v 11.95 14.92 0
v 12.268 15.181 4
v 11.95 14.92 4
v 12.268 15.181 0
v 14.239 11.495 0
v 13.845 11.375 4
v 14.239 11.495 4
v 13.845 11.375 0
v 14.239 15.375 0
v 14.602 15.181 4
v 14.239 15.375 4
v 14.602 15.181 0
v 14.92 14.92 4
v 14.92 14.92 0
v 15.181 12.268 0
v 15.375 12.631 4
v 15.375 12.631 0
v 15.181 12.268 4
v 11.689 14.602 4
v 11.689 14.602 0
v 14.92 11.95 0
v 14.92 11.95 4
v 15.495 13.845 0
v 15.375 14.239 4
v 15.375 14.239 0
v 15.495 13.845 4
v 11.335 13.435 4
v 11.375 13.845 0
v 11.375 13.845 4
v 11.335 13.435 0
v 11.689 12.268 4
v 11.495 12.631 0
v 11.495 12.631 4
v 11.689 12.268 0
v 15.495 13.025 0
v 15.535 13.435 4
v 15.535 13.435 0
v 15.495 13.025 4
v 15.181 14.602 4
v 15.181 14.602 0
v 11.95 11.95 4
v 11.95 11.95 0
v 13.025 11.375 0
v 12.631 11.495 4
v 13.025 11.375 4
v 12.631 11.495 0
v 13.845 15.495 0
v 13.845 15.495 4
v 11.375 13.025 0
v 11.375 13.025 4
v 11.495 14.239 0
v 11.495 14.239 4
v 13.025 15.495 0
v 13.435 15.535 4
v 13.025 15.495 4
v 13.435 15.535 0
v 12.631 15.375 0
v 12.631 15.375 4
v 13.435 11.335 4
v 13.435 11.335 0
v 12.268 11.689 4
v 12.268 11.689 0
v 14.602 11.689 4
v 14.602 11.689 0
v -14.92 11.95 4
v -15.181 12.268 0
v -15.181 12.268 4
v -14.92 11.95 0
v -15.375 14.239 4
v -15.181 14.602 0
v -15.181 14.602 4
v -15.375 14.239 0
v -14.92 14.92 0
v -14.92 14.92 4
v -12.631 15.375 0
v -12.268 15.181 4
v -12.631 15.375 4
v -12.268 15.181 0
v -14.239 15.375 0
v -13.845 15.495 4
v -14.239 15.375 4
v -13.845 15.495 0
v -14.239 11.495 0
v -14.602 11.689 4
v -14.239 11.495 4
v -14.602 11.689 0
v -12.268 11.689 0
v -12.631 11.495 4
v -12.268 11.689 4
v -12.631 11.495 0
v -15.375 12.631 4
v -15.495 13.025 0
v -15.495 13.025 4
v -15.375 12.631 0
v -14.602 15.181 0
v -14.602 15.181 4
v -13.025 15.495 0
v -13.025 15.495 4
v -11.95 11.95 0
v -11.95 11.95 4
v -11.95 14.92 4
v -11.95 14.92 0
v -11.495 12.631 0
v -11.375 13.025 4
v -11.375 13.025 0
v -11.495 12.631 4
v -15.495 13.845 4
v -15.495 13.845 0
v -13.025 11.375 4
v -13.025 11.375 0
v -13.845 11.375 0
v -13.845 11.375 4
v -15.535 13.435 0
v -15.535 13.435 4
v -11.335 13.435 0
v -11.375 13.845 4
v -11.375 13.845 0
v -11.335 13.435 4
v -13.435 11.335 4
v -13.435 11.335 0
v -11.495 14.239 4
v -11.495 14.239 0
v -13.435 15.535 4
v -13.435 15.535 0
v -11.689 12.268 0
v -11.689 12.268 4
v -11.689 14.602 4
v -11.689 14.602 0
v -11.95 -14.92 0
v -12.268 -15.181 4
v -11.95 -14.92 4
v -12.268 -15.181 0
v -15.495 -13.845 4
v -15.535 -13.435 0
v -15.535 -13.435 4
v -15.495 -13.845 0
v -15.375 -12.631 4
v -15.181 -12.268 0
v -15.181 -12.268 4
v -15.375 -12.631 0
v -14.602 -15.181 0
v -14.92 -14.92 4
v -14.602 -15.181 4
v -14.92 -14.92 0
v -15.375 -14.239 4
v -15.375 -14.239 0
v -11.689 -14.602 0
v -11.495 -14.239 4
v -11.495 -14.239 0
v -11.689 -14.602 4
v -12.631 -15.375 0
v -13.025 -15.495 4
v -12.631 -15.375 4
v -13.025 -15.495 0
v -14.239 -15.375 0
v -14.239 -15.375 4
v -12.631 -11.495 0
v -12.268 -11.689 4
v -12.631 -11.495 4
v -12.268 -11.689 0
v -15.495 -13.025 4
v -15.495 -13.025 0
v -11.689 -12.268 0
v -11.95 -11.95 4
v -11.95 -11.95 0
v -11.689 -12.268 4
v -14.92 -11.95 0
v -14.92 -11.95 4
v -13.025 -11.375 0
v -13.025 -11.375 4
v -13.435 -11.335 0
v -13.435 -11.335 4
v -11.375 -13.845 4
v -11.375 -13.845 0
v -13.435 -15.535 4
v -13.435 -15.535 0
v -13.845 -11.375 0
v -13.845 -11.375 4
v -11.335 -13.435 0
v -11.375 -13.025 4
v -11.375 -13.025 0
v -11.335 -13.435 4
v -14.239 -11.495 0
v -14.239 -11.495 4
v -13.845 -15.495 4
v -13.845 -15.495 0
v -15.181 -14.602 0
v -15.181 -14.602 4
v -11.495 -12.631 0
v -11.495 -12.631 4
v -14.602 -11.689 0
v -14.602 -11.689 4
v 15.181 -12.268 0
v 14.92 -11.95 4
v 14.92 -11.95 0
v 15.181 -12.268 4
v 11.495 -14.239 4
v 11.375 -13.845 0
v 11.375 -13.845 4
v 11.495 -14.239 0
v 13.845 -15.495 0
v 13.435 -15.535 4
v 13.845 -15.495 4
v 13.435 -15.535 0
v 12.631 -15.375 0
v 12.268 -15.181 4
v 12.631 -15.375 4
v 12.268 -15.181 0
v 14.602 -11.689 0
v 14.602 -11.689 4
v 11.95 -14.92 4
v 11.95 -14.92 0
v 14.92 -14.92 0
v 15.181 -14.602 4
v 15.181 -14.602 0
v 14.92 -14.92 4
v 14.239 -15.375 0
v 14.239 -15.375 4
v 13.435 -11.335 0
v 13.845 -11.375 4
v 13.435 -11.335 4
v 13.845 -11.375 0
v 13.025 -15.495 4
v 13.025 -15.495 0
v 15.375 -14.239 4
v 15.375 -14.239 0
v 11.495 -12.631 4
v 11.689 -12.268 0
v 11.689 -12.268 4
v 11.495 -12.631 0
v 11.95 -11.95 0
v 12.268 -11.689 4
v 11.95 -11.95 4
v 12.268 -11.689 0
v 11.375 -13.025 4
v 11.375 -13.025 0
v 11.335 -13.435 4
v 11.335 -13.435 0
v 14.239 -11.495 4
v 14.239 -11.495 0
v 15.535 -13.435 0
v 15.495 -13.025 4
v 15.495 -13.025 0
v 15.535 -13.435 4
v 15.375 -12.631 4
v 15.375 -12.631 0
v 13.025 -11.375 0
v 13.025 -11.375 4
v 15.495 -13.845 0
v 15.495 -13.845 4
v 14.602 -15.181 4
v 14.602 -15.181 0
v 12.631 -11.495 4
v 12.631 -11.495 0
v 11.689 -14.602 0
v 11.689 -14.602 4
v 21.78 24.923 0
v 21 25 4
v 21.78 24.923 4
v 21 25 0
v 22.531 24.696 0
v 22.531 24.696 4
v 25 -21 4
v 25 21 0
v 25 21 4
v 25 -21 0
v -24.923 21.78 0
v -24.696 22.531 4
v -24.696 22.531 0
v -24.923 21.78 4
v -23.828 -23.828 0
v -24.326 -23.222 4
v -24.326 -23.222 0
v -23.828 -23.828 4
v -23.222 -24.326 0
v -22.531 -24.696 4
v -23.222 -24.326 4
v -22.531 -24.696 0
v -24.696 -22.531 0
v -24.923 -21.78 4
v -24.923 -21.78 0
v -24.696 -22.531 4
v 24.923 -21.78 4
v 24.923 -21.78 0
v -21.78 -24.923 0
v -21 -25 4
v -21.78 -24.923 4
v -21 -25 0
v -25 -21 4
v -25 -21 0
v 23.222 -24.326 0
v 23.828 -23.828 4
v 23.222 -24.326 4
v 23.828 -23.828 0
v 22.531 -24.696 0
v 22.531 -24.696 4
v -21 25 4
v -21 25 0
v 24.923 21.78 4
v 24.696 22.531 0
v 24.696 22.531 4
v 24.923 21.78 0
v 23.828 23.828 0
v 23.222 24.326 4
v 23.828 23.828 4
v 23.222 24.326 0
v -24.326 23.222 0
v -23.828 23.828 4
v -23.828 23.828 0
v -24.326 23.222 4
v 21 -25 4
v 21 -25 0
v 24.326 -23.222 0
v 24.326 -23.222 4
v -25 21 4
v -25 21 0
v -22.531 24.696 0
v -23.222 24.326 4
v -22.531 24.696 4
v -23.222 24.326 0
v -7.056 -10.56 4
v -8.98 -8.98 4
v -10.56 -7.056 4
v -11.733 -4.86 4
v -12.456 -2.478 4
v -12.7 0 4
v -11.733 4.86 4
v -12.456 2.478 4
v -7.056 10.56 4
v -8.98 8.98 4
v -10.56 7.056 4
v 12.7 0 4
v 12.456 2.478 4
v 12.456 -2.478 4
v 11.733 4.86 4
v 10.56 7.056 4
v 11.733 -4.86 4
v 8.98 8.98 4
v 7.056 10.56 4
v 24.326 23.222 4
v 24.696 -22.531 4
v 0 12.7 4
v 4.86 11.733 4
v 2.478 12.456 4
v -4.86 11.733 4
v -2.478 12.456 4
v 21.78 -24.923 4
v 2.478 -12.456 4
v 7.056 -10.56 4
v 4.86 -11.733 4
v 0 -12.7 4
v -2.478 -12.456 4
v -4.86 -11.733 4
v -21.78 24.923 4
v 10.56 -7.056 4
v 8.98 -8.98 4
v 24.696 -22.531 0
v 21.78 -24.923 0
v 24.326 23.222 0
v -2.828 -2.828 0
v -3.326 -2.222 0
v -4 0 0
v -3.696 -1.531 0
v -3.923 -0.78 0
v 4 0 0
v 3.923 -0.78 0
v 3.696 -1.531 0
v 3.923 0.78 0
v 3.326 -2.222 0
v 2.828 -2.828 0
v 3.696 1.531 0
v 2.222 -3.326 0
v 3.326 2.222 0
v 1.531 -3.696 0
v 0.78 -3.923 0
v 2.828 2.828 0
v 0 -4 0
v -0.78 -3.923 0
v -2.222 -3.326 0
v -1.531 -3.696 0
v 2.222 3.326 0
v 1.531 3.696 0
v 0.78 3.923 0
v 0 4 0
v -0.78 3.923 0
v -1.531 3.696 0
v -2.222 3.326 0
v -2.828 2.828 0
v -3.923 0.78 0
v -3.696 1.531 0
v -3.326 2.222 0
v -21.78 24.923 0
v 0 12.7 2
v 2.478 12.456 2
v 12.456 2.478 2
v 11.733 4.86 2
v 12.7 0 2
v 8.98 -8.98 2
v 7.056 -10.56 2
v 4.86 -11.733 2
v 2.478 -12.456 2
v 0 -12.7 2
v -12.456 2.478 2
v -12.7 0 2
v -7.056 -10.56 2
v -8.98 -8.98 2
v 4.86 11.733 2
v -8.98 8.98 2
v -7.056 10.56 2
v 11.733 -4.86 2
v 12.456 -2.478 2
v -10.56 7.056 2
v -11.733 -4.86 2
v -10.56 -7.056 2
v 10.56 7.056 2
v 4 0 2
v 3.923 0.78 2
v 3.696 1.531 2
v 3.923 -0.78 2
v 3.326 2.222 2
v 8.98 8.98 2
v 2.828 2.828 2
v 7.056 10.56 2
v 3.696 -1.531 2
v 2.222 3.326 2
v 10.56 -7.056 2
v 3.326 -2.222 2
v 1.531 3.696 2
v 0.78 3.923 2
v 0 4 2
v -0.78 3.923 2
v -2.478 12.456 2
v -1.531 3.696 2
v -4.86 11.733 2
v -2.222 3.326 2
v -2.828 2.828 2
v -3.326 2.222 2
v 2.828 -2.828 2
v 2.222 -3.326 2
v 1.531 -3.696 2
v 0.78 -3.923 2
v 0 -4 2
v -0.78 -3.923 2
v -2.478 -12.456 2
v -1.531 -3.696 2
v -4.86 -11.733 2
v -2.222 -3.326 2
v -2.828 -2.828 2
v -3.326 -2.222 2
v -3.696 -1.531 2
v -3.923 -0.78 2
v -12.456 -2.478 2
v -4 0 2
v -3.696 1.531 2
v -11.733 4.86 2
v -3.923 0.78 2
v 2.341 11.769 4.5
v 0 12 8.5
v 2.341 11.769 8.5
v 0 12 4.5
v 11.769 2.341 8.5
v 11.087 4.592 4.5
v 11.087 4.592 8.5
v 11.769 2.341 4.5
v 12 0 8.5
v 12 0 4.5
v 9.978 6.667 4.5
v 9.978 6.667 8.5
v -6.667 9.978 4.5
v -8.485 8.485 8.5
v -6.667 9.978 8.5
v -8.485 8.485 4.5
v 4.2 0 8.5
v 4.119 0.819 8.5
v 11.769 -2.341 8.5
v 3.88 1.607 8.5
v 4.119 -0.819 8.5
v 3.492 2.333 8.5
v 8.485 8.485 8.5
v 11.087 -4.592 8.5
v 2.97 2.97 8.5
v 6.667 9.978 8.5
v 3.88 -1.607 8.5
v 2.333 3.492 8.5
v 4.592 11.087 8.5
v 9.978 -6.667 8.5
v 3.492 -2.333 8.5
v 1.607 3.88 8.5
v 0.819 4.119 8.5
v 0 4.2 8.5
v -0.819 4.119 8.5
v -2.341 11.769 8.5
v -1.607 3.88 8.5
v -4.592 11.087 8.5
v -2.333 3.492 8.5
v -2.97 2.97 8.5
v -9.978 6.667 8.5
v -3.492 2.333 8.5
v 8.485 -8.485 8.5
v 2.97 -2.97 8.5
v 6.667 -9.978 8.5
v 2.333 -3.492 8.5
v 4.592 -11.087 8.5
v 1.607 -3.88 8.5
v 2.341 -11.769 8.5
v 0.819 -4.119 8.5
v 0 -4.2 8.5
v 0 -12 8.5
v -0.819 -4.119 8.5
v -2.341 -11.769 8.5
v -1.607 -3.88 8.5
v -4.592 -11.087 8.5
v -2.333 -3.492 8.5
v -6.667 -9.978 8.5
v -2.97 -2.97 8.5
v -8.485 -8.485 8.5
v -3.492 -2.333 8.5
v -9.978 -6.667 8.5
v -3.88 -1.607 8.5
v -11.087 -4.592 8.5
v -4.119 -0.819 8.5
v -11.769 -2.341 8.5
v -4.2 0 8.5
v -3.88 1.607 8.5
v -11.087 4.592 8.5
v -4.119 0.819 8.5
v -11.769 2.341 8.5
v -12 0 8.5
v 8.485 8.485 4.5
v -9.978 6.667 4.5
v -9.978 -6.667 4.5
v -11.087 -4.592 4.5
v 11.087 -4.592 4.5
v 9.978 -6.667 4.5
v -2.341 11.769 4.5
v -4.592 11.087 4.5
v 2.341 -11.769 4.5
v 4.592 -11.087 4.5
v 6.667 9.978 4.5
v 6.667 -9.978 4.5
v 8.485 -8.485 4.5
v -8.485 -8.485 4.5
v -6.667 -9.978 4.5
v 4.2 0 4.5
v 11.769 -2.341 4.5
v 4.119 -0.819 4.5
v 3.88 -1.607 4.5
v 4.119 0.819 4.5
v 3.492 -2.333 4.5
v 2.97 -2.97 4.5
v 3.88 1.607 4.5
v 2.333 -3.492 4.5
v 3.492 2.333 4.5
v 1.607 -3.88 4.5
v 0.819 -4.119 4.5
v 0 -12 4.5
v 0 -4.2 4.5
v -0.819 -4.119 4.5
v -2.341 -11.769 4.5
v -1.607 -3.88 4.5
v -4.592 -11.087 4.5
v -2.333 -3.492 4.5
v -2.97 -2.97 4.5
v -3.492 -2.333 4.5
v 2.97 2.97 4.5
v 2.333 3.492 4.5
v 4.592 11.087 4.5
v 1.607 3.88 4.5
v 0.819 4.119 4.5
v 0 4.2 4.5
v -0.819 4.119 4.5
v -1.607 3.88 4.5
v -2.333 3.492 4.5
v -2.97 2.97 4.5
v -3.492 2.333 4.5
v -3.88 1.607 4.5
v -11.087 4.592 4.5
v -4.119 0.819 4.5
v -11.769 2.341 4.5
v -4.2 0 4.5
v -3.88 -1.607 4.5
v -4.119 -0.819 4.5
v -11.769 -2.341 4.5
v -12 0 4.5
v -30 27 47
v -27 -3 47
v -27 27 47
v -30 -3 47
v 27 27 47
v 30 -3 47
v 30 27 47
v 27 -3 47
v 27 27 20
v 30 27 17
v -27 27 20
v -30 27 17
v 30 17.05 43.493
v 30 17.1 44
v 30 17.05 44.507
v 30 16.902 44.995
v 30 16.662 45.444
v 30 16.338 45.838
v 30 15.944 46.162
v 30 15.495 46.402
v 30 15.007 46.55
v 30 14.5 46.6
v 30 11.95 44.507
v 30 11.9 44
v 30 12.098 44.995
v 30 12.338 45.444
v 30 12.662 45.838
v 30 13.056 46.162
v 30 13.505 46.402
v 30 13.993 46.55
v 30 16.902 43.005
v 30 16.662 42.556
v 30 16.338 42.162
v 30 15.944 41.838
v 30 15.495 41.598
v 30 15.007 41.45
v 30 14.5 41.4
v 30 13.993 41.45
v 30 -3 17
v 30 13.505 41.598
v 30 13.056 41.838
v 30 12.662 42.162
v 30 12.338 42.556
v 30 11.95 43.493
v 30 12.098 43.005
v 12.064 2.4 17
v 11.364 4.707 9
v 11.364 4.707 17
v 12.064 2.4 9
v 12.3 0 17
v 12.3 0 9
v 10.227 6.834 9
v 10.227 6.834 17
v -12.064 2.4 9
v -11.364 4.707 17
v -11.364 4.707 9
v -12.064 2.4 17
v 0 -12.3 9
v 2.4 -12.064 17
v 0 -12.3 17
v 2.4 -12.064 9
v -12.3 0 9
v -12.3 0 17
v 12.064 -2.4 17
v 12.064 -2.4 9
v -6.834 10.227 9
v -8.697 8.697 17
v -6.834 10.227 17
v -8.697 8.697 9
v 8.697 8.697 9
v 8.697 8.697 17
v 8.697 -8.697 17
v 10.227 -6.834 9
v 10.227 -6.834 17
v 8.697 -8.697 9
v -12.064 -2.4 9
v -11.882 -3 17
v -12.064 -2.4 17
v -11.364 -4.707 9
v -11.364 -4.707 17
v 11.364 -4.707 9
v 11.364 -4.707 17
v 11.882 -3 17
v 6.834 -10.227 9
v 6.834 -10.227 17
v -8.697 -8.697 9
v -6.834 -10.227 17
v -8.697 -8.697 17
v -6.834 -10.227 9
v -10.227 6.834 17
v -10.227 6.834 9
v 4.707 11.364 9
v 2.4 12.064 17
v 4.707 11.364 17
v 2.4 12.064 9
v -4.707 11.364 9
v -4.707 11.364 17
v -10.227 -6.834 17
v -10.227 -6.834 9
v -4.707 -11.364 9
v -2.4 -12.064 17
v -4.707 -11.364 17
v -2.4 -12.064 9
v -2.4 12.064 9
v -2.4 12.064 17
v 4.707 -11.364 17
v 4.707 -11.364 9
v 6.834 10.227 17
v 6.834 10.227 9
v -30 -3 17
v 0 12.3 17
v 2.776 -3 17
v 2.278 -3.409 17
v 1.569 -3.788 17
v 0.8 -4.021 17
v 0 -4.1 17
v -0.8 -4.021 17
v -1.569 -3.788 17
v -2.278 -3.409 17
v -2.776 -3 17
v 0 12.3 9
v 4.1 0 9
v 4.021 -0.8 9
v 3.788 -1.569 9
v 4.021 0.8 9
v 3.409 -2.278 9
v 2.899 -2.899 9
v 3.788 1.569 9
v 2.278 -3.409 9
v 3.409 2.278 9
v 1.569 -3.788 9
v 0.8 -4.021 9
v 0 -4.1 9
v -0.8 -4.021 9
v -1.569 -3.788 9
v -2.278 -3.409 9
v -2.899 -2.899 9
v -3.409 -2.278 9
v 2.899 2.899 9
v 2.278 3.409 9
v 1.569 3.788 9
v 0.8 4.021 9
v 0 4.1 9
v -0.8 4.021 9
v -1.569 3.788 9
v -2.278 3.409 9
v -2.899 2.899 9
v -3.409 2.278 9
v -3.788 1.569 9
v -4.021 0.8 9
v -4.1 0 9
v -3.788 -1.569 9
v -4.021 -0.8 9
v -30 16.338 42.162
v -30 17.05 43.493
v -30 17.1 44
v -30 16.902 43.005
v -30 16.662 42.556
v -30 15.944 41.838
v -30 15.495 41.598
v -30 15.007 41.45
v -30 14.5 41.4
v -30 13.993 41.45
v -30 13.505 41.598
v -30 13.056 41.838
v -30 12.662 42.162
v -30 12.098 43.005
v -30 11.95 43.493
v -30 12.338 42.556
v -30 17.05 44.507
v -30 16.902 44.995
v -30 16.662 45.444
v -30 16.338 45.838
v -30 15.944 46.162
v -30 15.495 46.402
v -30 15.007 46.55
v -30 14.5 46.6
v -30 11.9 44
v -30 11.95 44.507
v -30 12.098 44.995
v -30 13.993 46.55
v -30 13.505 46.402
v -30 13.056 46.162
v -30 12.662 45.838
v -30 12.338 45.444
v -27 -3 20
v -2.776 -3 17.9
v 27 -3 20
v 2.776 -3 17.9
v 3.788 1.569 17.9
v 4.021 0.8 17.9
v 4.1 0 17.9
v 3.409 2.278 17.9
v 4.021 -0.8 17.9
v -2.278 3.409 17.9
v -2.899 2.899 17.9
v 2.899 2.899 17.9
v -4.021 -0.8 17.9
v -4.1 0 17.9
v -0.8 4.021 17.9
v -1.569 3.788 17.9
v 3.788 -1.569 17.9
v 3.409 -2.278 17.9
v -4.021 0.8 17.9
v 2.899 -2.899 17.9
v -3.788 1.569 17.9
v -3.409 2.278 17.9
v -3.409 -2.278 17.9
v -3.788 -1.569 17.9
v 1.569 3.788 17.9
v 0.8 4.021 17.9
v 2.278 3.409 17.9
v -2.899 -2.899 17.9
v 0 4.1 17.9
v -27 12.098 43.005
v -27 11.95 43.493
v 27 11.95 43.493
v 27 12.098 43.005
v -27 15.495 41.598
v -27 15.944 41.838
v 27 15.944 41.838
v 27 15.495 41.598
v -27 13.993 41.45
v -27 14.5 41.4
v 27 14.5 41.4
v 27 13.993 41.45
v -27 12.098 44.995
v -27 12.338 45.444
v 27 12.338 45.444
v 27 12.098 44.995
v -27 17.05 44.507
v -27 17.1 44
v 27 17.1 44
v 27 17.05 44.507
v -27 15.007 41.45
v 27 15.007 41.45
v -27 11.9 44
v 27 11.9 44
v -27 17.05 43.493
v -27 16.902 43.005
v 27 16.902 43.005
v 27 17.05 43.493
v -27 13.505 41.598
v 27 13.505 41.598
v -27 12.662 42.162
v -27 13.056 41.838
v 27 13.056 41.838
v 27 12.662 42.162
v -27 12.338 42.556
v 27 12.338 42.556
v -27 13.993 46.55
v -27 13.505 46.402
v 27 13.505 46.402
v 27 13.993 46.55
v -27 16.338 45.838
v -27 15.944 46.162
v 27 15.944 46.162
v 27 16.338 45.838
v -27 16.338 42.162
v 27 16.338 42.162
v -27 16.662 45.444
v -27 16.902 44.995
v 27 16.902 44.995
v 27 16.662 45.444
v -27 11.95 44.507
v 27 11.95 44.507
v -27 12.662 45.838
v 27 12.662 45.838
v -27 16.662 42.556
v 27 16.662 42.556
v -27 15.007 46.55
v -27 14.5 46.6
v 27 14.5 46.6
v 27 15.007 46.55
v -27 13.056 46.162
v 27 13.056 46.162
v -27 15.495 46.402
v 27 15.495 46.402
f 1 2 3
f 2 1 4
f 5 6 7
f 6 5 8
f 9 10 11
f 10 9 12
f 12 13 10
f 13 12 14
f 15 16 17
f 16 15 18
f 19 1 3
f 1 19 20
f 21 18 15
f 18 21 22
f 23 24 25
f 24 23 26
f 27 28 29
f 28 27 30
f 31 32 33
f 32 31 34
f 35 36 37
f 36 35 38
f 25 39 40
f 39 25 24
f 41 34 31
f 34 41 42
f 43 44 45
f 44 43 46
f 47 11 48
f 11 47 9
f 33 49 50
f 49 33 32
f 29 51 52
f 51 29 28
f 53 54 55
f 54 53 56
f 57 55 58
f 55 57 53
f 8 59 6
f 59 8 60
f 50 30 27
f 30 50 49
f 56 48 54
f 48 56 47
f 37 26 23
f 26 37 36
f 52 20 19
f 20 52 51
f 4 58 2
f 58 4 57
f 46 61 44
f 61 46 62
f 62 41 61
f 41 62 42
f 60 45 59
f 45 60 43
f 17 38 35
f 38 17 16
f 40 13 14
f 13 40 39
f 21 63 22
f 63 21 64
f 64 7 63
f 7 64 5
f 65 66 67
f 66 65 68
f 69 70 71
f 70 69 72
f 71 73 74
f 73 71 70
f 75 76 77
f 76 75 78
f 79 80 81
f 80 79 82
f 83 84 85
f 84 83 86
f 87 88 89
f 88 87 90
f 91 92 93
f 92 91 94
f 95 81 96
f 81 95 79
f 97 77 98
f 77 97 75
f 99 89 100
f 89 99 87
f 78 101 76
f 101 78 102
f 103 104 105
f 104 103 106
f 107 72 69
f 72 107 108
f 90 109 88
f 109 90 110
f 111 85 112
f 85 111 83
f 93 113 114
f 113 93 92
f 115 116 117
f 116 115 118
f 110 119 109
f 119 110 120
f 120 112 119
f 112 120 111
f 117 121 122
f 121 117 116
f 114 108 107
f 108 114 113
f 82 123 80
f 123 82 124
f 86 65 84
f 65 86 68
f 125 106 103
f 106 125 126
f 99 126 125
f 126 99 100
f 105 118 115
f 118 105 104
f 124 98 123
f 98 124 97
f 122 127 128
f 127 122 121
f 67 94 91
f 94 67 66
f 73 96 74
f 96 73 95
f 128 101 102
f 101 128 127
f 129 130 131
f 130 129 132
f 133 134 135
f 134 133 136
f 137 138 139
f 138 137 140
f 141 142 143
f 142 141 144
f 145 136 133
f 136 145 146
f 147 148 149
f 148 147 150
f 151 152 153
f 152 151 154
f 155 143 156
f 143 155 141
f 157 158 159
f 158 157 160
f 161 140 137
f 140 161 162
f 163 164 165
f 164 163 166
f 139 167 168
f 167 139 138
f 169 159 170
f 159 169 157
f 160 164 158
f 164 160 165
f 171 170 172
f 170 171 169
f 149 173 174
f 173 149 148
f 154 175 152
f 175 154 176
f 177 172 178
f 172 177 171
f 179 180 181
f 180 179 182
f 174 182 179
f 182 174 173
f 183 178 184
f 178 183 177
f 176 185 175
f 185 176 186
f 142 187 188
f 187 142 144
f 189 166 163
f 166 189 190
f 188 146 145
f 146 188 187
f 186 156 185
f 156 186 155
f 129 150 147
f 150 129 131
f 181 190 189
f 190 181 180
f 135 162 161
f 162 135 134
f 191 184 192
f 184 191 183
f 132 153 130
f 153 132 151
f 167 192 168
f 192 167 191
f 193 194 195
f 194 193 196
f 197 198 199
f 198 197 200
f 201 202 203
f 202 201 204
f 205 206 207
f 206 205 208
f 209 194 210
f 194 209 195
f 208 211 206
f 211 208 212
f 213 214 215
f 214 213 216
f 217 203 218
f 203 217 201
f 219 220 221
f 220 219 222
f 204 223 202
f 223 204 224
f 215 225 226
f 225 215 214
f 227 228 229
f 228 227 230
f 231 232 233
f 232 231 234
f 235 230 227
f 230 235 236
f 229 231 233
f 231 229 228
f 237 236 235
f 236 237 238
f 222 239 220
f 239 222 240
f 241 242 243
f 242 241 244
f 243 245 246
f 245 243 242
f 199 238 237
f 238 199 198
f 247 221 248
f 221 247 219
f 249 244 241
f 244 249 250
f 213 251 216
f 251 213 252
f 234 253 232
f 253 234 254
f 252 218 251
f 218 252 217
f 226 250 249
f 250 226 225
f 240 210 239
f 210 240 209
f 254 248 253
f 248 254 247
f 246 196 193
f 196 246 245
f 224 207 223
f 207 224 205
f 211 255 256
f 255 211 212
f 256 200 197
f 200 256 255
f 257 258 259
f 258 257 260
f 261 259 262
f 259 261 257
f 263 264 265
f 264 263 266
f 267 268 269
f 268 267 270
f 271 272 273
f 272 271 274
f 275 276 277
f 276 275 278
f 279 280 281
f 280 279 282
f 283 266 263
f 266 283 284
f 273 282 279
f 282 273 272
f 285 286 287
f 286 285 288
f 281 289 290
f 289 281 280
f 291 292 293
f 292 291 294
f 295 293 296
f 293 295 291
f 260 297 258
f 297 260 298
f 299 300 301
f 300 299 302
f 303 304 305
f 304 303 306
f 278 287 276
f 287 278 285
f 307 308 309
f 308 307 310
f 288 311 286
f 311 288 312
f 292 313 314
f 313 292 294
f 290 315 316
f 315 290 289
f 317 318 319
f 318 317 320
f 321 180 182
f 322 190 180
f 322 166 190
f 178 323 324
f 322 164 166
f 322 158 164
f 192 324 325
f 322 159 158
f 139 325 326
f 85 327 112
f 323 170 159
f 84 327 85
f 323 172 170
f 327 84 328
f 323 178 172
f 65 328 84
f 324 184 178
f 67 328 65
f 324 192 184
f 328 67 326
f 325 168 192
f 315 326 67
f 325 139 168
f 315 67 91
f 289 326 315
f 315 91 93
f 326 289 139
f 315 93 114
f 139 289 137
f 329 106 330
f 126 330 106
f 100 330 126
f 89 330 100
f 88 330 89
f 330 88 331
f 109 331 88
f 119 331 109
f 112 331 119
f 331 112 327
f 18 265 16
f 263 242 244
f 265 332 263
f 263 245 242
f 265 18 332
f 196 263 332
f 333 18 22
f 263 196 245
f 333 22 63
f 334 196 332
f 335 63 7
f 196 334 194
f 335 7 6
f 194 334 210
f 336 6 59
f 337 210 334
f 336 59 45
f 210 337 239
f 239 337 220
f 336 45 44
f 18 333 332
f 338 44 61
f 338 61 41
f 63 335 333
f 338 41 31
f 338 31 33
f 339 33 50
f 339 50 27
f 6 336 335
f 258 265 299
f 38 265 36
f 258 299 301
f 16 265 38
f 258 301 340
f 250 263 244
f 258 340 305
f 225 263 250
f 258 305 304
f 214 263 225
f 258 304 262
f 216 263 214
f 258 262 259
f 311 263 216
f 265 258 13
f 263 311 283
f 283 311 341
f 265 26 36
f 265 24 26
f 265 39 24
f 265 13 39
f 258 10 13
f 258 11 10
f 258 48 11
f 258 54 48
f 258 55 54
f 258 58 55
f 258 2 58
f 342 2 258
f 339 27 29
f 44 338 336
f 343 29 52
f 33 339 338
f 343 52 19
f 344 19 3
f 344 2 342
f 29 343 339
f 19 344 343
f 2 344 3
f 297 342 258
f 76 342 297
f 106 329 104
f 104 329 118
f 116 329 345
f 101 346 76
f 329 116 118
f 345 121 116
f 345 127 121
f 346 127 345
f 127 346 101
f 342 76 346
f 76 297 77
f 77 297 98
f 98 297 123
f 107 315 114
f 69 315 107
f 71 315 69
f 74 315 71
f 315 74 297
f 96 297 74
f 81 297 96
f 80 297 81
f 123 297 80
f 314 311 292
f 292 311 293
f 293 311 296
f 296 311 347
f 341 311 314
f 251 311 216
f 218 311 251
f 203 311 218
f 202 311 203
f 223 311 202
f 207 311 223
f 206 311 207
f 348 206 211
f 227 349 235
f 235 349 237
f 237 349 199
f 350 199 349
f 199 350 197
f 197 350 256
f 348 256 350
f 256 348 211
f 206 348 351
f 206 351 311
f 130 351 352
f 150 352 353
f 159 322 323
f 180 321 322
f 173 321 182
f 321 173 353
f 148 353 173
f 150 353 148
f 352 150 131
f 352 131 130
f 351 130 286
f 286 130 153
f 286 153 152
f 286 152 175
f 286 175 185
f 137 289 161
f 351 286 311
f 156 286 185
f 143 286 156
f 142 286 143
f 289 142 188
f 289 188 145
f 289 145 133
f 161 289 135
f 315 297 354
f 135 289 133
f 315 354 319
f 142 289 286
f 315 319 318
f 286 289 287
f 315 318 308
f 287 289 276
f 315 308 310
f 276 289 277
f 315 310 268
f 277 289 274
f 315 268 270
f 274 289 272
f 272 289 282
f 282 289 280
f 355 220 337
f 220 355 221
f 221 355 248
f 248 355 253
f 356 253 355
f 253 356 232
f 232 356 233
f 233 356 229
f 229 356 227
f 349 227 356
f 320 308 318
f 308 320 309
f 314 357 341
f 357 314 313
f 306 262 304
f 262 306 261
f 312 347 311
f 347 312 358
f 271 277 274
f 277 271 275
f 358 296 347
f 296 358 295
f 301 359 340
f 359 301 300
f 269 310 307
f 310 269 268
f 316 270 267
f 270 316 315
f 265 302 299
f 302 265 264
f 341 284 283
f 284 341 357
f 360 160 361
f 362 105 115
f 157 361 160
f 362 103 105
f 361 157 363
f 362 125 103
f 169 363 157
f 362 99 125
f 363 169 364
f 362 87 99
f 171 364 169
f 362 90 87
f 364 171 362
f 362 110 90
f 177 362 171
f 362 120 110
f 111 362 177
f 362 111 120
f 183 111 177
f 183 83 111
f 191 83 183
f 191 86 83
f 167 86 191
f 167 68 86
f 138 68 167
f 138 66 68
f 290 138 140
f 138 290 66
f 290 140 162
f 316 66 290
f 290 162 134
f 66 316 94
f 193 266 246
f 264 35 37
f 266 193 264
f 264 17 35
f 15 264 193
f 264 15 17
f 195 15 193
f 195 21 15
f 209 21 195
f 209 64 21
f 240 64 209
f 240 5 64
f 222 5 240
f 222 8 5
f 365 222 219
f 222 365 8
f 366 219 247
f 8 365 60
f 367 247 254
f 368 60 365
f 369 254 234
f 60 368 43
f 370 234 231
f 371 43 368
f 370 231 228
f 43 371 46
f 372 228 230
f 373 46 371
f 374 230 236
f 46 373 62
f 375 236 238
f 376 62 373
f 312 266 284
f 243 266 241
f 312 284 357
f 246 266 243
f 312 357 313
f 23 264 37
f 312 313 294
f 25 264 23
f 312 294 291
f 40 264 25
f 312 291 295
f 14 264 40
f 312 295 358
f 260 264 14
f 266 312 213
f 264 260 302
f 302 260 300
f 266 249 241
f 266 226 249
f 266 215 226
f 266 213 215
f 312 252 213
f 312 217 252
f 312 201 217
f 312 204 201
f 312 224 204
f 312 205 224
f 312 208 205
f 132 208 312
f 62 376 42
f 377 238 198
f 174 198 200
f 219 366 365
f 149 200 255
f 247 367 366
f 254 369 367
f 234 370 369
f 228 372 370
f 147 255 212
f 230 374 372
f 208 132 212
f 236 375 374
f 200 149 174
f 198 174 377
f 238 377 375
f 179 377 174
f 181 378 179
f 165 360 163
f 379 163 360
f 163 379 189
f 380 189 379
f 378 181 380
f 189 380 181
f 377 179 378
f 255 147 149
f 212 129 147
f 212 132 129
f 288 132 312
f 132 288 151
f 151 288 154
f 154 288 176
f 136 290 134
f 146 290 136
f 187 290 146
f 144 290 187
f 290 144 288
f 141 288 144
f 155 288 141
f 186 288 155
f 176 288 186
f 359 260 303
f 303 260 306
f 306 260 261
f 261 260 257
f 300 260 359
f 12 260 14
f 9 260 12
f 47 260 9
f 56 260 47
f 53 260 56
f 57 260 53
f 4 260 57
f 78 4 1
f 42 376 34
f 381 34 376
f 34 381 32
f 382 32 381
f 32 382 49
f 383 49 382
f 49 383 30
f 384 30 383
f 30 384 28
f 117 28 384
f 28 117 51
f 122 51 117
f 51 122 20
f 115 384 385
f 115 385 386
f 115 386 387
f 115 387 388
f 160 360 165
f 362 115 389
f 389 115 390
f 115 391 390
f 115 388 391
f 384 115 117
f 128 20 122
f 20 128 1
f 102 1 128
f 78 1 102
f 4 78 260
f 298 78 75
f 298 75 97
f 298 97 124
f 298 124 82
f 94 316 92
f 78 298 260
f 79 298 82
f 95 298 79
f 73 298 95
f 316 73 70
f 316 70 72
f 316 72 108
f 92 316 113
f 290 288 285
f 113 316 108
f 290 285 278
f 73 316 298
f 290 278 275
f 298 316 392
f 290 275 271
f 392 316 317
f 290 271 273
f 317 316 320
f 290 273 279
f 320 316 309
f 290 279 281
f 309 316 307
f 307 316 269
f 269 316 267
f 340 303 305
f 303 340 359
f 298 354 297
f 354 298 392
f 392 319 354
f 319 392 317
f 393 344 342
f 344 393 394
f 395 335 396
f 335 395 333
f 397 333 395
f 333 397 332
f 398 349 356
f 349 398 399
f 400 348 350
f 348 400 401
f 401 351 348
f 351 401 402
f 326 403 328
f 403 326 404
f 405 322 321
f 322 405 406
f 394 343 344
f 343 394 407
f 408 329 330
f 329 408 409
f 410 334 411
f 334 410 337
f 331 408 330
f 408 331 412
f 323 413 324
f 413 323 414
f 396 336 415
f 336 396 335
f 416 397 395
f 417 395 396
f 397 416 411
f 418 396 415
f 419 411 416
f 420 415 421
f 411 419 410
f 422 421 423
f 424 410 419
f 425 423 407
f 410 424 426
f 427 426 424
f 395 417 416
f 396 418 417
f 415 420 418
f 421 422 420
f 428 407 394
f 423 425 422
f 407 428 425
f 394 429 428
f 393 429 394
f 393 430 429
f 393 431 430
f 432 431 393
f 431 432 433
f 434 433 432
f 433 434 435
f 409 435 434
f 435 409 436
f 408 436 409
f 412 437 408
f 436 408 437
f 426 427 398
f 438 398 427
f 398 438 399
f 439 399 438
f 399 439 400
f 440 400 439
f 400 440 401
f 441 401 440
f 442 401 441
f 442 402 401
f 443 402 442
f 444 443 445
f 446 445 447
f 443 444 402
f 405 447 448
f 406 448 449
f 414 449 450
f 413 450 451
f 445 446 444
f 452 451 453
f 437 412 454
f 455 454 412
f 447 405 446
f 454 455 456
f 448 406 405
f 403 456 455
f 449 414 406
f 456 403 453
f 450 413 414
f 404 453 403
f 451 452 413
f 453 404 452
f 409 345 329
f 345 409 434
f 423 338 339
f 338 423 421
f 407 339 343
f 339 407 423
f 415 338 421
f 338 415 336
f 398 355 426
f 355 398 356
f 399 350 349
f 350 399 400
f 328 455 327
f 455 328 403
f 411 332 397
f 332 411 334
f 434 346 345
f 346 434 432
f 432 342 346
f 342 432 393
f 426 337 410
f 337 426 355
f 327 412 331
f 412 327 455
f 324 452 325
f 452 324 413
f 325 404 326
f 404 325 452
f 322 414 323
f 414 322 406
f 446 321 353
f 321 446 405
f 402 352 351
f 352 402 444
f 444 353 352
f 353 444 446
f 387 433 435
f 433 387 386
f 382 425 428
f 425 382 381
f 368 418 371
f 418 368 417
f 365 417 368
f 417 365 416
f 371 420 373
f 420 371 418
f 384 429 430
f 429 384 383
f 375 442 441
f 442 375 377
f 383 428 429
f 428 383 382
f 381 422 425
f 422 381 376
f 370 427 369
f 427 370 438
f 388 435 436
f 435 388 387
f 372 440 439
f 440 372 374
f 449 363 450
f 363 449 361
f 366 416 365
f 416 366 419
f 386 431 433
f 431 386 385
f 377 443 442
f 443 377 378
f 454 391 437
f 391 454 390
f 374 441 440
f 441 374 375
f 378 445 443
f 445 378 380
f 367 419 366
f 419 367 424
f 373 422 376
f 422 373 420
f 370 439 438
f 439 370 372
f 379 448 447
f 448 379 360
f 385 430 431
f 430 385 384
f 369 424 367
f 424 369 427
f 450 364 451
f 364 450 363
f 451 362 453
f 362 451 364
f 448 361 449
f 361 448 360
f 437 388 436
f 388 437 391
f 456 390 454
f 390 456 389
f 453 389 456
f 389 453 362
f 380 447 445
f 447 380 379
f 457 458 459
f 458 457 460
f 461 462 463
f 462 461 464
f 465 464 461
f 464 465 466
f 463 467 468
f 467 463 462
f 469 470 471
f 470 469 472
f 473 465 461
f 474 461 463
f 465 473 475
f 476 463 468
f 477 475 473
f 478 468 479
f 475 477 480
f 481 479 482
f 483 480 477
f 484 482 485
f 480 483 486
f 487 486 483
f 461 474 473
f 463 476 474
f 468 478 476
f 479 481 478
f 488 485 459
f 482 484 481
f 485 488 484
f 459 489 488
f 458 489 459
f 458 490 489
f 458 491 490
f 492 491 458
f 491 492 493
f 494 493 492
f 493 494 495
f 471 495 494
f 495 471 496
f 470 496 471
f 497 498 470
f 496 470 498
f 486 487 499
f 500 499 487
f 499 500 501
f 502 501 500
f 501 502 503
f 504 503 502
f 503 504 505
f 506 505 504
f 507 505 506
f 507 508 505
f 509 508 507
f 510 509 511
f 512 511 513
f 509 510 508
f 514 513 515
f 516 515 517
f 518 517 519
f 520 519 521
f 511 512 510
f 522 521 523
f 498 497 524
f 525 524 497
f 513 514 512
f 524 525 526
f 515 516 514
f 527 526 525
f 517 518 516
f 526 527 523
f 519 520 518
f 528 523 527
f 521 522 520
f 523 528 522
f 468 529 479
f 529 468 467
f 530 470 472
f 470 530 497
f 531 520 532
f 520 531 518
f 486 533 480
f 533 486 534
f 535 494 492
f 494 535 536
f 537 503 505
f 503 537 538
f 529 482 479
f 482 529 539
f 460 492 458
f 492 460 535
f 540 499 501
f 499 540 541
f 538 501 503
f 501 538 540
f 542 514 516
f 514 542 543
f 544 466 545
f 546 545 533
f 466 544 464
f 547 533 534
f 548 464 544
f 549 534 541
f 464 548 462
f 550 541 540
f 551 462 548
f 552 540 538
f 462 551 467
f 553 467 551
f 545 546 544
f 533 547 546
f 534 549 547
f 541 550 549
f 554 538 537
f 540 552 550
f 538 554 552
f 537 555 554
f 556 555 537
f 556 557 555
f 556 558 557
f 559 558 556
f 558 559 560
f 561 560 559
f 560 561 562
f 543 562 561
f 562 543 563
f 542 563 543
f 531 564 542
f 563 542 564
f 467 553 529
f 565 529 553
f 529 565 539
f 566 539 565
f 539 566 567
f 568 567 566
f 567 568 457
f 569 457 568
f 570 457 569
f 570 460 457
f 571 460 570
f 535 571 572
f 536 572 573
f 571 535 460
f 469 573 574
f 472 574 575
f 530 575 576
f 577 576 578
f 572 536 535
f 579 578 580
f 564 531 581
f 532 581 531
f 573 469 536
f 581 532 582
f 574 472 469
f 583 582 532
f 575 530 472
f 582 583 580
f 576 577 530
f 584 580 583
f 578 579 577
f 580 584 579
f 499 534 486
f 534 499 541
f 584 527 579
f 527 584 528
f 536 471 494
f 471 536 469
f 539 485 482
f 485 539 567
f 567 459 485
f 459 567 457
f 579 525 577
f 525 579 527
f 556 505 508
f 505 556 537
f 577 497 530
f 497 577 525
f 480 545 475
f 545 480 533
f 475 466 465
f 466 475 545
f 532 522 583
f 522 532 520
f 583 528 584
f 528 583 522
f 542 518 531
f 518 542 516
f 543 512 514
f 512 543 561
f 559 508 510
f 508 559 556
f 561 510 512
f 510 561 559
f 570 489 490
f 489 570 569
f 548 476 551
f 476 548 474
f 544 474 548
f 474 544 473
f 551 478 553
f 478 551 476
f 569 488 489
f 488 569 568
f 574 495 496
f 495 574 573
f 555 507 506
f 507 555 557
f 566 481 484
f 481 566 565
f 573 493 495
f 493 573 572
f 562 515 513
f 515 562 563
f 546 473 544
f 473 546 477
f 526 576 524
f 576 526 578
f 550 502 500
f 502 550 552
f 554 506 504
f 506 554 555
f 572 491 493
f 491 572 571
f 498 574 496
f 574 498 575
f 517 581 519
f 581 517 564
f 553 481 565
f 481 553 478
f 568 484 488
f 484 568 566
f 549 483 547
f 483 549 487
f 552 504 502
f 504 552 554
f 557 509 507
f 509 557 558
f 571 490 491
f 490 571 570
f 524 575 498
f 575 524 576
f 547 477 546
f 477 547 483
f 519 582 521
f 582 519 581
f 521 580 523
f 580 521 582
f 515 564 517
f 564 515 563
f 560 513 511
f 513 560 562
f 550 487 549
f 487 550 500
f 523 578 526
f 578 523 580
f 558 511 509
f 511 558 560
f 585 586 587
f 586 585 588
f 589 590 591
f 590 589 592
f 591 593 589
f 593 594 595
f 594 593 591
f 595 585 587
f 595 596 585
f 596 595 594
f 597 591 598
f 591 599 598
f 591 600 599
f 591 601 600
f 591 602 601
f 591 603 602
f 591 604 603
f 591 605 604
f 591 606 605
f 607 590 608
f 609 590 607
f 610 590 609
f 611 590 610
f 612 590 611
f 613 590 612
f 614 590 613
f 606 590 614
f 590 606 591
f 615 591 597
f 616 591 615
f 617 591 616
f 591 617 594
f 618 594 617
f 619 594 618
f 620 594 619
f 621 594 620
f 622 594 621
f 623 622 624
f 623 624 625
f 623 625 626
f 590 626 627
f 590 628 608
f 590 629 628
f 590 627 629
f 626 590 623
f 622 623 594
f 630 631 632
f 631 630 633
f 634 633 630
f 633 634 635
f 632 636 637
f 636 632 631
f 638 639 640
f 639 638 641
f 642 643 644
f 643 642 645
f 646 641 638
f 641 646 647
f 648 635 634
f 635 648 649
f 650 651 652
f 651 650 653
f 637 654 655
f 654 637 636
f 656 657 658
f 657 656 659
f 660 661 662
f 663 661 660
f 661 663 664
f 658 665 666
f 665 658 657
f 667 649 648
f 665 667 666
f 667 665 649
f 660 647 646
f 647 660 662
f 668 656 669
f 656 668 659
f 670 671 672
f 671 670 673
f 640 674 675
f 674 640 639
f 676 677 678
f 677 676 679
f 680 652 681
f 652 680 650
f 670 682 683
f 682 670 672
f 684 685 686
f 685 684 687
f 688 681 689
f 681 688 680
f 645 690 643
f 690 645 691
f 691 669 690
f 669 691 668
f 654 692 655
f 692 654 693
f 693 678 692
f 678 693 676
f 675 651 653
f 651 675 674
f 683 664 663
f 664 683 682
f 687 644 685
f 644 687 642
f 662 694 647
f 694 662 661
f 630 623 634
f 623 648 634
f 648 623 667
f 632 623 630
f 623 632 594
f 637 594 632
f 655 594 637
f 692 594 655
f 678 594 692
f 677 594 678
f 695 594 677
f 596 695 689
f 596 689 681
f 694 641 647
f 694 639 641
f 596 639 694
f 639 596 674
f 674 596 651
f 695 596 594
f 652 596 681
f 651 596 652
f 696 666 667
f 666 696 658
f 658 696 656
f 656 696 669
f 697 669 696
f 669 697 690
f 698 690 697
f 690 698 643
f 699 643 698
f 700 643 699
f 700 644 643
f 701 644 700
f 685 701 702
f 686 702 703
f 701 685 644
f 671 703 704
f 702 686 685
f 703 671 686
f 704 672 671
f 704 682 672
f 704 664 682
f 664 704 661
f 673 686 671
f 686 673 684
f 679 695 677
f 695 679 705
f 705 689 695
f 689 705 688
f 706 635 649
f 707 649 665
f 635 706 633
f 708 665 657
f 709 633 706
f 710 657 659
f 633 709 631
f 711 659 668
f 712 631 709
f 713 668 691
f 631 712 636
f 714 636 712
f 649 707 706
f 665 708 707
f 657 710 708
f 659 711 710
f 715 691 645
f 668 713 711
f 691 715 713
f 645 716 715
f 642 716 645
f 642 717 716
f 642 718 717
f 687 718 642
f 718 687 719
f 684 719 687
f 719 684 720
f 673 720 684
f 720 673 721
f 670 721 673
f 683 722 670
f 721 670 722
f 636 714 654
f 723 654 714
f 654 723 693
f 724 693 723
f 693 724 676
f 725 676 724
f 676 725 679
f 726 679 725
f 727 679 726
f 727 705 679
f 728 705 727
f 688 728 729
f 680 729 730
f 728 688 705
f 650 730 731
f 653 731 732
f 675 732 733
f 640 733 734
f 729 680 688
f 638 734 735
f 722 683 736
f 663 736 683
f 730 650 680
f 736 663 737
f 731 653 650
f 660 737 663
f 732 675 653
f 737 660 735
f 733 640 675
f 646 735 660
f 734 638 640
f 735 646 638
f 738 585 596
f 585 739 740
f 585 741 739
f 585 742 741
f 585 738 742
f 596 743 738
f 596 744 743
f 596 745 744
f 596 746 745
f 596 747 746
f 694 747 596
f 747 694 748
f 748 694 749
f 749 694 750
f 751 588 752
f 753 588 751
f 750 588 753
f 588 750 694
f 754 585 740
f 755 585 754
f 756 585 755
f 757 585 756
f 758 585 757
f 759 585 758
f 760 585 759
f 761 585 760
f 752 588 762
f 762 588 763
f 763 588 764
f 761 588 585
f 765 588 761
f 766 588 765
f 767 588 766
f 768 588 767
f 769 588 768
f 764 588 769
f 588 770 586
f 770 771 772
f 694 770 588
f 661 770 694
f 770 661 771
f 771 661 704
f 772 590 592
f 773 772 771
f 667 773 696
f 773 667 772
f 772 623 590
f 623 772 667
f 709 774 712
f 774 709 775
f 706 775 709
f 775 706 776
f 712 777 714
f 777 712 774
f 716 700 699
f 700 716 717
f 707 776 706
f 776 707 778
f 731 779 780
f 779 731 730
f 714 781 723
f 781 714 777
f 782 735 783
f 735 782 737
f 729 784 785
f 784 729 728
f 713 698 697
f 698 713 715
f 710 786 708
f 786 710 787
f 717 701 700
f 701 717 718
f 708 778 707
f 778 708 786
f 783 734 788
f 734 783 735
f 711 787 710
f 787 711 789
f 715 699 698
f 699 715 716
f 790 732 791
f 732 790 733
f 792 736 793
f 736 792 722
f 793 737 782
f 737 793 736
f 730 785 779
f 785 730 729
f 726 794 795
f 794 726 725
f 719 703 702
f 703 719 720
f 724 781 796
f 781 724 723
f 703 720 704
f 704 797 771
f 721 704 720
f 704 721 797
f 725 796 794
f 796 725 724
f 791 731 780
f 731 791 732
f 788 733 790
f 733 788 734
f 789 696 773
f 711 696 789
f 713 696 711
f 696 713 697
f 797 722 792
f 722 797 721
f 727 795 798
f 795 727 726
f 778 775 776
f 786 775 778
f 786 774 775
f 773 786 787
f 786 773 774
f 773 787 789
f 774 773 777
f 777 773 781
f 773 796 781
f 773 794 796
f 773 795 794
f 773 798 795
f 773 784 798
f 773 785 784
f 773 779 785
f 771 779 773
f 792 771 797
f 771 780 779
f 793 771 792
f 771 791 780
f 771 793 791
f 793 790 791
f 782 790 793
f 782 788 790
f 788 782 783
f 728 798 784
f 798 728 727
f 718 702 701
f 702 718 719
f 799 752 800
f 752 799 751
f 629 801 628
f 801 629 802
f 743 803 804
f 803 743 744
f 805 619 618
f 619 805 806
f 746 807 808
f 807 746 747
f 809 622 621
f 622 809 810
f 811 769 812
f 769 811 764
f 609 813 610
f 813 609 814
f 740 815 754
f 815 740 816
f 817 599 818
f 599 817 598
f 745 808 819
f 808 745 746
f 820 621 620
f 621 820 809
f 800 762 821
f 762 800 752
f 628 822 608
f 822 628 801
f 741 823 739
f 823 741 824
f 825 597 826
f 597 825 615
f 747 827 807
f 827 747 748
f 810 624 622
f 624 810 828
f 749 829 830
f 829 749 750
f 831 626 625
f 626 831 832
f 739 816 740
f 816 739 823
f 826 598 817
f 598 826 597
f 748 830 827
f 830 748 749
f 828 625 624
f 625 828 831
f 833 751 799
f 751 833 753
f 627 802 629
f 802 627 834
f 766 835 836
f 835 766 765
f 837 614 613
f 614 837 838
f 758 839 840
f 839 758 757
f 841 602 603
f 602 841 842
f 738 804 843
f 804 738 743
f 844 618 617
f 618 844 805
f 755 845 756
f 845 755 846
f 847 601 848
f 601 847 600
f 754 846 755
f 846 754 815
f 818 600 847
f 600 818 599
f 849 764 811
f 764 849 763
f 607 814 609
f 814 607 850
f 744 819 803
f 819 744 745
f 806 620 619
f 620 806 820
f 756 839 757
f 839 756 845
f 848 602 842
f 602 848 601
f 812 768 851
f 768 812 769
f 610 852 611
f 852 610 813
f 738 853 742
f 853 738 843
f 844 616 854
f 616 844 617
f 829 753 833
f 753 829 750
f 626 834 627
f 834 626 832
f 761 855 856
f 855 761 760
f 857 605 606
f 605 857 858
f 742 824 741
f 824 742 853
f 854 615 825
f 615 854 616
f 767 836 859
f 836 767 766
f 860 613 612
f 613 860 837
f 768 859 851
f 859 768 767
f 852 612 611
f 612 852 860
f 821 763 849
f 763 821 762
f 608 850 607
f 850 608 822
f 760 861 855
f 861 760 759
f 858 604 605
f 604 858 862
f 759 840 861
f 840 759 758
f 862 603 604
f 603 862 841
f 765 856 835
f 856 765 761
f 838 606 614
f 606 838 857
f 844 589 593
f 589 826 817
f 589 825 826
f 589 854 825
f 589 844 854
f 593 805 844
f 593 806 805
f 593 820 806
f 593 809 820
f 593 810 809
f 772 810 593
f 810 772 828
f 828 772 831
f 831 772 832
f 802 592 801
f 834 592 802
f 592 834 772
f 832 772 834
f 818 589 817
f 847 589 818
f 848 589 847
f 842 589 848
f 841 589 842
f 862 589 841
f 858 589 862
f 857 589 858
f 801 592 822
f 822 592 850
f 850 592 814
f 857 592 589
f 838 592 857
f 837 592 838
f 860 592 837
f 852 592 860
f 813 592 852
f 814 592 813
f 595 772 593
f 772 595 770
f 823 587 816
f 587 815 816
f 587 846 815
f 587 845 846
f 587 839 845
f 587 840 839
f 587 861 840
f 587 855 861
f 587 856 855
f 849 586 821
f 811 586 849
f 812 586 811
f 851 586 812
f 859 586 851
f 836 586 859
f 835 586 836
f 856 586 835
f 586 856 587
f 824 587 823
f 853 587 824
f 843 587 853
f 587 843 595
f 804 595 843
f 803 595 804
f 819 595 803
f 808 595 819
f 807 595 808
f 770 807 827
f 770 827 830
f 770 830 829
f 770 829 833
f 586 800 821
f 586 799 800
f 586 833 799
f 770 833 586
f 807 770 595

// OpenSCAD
// ============================================================
// caster_wheel_bracket.scad
// Swivel Caster Wheel Bracket for Humanoid Welcoming Robot
// Swivel mount for 50 mm caster wheel with shock-absorbing base
//
// Print Settings:
//   Material:    PETG (flexible properties)
//   Infill:      60%
//   Layer height: 0.2 mm
//   Supports:    None required
//   Weight:      ~12 g
//   Print time:  ~7 minutes
// ============================================================

$fn = 32;
$fa = 6;
$fs = 1;

// --- Parametric Variables ---
wheel_diameter         = 50;   // mm  caster wheel outer diameter
wheel_bore             = 5;    // mm  caster axle diameter
base_mount_holes       = 4;    // number of M4 mounting bolts
swivel_bearing_diameter = 25;  // mm  ball bearing outer diameter
mounting_hole_diameter = 4.2;  // mm  M4 bolt clearance
wall_thickness         = 2.5;  // mm  bracket wall thickness
plate_thickness        = 4.0;  // mm  mounting plate thickness
fork_thickness         = 3.0;  // mm  fork arm thickness
fork_height            = 30;   // mm  fork arm height (wheel clearance)
axle_boss_height       = 6;    // mm  axle boss length each side

// Derived
wheel_radius    = wheel_diameter / 2;
bearing_radius  = swivel_bearing_diameter / 2;
plate_size      = 50;          // mm  square mounting plate side

// ============================================================
// Module: mounting_plate
// Flat base plate with 4-hole M4 bolt pattern
// ============================================================
module mounting_plate() {
    bolt_offset = plate_size / 2 - 6;
    difference() {
        // Rounded rectangle plate
        hull()
            for (sx = [-1, 1])
                for (sy = [-1, 1])
                    translate([sx * (plate_size / 2 - 4),
                               sy * (plate_size / 2 - 4), 0])
                        cylinder(r = 4, h = plate_thickness);
        // Central swivel bearing recess
        translate([0, 0, plate_thickness - 2])
            cylinder(d = swivel_bearing_diameter + 0.4, h = 2.1);
        // Bearing through-hole for swivel pin
        translate([0, 0, -0.1])
            cylinder(d = 8, h = plate_thickness + 0.2);
        // 4× mounting bolt holes
        for (a = [0, 90, 180, 270])
            rotate([0, 0, a + 45])
                translate([bolt_offset, 0, -0.1])
                    cylinder(d = mounting_hole_diameter,
                             h = plate_thickness + 0.2);
    }
}

// ============================================================
// Module: swivel_yoke
// Rotating U-shaped fork that holds the wheel
// ============================================================
module swivel_yoke() {
    fork_width   = wheel_diameter + 2 * fork_thickness + 4;
    fork_inner_w = wheel_diameter + 4;

    difference() {
        union() {
            // Top swivel hub (mates with bearing)
            cylinder(d = swivel_bearing_diameter - 0.4, h = 8);
            // Fork body
            translate([-fork_width / 2, -fork_thickness, 8])
                cube([fork_width, fork_thickness + wheel_radius + 2,
                      fork_height]);
            // Fork arms (two sides holding axle)
            for (sx = [-1, 1])
                translate([sx * (fork_inner_w / 2),
                           0, 8 + fork_height - axle_boss_height])
                    cube([fork_thickness, wheel_radius + 2,
                          axle_boss_height]);
        }
        // Swivel pin bore
        translate([0, 0, -0.1])
            cylinder(d = 8.2, h = 9);
        // Wheel axle bore (through both fork arms)
        translate([0, wheel_radius / 2 + 2,
                   8 + fork_height - axle_boss_height / 2])
            rotate([0, 90, 0])
                cylinder(d = wheel_bore + 0.2,
                         h = fork_width + 0.2, center = true);
        // Wheel clearance slot in fork body
        translate([-fork_inner_w / 2,
                   wheel_radius / 2 - wheel_radius,
                   8 + fork_height - wheel_radius - 2])
            cube([fork_inner_w, wheel_diameter + 2, wheel_diameter + 2]);
    }
}

// ============================================================
// Module: elastomer_bushing
// Soft bushing ring between plate and yoke for shock absorption
// ============================================================
module elastomer_bushing() {
    bushing_h  = 4;
    bushing_id = 8.4;
    bushing_od = swivel_bearing_diameter - 1;
    difference() {
        cylinder(d = bushing_od, h = bushing_h);
        translate([0, 0, -0.1])
            cylinder(d = bushing_id, h = bushing_h + 0.2);
    }
}

// ============================================================
// Module: caster_wheel_bracket
// Complete bracket assembly
// ============================================================
module caster_wheel_bracket() {
    mounting_plate();
    translate([0, 0, plate_thickness + 0.5])
        elastomer_bushing();
    translate([0, 0, plate_thickness + 5])
        swivel_yoke();
}

// ============================================================
// Render
// ============================================================
color("DarkSeaGreen")
    caster_wheel_bracket();
